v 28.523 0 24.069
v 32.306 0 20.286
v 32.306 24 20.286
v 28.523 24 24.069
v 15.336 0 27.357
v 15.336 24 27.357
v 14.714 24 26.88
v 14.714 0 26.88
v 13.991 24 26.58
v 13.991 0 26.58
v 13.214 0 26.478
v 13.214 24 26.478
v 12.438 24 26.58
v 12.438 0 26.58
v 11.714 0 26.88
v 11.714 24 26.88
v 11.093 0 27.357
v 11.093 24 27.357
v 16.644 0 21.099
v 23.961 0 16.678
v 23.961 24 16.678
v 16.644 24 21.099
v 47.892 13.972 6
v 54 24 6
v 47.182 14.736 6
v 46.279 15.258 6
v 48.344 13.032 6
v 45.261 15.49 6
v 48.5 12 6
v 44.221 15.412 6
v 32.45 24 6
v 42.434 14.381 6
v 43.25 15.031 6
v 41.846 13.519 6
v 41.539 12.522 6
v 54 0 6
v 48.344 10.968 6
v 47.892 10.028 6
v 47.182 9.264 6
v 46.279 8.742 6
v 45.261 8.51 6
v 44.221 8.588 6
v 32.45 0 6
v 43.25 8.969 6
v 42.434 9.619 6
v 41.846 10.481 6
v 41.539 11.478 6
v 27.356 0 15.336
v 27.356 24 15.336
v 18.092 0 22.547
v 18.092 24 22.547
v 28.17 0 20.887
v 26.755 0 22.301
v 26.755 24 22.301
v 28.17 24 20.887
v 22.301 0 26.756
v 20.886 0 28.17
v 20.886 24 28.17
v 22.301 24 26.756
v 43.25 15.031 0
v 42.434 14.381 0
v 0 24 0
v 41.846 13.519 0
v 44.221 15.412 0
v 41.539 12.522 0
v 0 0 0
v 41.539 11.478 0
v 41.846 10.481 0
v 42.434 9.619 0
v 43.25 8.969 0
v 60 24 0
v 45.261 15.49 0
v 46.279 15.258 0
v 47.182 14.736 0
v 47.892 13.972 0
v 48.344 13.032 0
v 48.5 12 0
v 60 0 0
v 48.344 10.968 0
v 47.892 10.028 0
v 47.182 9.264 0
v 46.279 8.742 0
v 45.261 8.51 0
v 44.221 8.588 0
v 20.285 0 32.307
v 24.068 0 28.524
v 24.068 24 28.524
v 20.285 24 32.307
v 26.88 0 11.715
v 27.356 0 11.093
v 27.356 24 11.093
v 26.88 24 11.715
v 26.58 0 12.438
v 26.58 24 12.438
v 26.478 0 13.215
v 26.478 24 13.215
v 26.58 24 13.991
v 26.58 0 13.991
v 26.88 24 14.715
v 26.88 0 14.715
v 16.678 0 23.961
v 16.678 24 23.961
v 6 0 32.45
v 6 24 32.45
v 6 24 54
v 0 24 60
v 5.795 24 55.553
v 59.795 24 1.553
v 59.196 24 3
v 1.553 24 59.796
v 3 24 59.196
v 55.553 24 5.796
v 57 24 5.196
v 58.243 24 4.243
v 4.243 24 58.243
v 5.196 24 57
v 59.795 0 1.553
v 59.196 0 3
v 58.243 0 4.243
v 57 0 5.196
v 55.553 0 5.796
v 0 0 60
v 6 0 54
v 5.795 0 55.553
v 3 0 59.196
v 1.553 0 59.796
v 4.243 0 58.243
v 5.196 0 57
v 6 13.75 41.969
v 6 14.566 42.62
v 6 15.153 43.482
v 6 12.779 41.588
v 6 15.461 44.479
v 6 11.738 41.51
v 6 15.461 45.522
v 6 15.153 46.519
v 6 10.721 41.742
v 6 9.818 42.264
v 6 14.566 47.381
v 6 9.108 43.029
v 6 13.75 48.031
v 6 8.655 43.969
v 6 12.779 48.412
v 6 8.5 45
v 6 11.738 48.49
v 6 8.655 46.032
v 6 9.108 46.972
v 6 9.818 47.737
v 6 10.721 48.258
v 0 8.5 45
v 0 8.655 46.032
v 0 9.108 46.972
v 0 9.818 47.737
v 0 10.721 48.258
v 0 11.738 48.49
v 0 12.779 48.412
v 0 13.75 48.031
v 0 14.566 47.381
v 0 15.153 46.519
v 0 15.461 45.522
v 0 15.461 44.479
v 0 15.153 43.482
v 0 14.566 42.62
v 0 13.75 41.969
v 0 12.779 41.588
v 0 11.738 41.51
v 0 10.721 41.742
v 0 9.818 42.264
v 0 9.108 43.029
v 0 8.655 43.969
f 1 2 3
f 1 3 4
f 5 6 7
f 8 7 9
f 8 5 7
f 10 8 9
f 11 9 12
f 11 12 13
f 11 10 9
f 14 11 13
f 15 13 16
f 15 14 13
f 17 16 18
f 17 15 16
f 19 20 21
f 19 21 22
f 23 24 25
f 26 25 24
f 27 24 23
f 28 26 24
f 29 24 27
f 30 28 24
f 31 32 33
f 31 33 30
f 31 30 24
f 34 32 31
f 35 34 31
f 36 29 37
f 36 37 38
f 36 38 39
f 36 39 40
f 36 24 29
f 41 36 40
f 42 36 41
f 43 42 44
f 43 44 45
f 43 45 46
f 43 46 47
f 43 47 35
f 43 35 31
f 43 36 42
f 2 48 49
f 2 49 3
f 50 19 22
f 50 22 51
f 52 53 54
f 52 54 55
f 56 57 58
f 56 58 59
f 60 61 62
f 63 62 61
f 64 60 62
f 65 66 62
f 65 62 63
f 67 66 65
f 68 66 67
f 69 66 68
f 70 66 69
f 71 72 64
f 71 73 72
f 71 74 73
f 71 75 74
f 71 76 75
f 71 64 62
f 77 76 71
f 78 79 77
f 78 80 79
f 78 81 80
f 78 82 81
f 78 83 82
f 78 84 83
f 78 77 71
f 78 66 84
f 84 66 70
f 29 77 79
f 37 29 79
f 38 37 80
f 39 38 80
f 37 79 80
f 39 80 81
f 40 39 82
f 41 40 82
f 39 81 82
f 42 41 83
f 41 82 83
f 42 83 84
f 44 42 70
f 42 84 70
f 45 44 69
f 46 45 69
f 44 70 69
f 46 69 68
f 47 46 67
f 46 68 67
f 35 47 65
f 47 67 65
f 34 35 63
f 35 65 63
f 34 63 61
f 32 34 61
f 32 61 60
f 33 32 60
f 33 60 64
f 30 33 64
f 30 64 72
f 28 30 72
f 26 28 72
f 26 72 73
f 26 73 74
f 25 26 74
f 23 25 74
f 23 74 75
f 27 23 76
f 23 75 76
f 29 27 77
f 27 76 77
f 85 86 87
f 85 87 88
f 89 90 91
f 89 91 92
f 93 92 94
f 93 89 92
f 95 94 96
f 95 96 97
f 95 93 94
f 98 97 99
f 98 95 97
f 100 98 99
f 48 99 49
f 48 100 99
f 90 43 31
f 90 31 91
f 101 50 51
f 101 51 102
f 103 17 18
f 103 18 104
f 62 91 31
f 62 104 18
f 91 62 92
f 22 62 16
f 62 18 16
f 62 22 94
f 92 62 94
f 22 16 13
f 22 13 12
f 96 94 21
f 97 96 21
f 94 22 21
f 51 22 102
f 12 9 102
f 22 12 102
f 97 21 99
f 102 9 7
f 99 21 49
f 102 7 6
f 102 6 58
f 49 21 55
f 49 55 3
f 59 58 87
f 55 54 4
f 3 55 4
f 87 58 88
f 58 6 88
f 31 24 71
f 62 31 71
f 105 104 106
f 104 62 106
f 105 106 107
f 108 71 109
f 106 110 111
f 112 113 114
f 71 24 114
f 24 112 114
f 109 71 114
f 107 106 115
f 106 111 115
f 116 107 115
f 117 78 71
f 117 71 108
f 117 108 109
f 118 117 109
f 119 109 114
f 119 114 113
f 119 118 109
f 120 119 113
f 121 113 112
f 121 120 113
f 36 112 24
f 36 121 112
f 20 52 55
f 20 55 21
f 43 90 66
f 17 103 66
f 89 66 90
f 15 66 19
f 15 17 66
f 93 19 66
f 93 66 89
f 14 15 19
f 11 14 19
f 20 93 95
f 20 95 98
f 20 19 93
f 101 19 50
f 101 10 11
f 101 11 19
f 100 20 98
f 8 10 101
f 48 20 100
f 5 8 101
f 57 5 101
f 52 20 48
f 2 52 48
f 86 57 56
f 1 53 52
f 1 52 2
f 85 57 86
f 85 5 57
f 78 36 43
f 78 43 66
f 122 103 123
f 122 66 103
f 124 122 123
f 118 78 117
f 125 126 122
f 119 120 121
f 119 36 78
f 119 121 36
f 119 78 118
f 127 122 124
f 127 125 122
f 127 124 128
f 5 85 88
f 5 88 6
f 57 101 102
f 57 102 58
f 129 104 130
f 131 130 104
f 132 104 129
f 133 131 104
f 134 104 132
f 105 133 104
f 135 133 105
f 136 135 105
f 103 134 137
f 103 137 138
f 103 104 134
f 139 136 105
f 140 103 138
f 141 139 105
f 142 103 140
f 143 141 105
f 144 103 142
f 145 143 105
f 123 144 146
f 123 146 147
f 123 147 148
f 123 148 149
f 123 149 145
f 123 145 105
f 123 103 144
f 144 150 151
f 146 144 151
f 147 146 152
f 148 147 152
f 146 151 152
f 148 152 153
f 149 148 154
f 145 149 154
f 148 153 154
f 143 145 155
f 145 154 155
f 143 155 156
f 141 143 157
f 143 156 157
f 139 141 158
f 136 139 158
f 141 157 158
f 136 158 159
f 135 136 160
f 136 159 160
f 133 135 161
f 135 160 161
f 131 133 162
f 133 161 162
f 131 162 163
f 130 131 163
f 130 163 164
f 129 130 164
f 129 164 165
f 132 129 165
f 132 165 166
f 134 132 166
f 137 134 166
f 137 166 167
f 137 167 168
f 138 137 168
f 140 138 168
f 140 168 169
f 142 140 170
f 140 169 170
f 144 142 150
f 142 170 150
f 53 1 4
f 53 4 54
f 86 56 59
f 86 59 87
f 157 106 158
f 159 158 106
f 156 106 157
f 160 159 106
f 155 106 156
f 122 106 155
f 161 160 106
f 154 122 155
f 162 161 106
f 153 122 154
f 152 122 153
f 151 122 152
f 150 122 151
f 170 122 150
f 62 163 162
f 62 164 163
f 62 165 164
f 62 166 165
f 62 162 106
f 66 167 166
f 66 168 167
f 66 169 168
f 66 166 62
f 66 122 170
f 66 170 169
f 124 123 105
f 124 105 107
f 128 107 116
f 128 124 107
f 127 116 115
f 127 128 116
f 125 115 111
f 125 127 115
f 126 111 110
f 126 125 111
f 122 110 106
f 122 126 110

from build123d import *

# Parameters (mm, degrees)
F1_DEPTH = 24
F2_R     = 3.5
F3_DEPTH = 6
F4_R     = 3.5
F5_DEPTH = 6


# Not quite as in the source:
# - ends of sketch curves that miss each other by under 0.0002 mm in the source are joined


with BuildPart() as f1:
    # F0 (on Front) → F1 (new body)
    with BuildSketch(Plane.XZ):
        with BuildLine():
            Line((5.999886, 45.000227), (-0.000114, 45.000227))
            Line((-0.000114, 45.000227), (-0.000114, 0.000227))
            Line((-0.000114, 0.000227), (44.999886, 0.000227))
            Line((44.999886, 0.000227), (44.999886, 6.000227))
            Line((44.999886, 6.000227), (32.449634, 6.000227))
            Line((32.449634, 6.000227), (27.356487, 11.093373))
            ThreePointArc((27.356487, 11.093373), (26.477808, 13.214693), (27.3564876564, 15.3360133436))
            Line((27.3564876564, 15.3360133436), (32.306235, 20.285761))
            Line((32.306235, 20.285761), (28.523214, 24.068783))
            Line((28.523214, 24.068783), (26.755447, 22.301016))
            Line((26.755447, 22.301016), (28.16966, 20.886802))
            Line((28.16966, 20.886802), (23.960753, 16.677895))
            Line((23.960753, 16.677895), (16.64382, 21.098934))
            Line((16.64382, 21.098934), (18.091767, 22.546881))
            Line((18.091767, 22.546881), (16.677553, 23.961095))
            Line((16.677553, 23.961095), (20.88646, 28.170002))
            Line((20.88646, 28.170002), (22.300674, 26.755788))
            Line((22.300674, 26.755788), (24.068441, 28.523555))
            Line((24.068441, 28.523555), (20.28542, 32.306577))
            Line((20.28542, 32.306577), (15.335672, 27.356829))
            ThreePointArc((15.335672, 27.356829), (13.2143523536, 26.47815), (11.0930316564, 27.3568296564))
            Line((11.0930316564, 27.3568296564), (5.999886, 32.449975))
            Line((5.999886, 32.449975), (5.999886, 45.000227))
        make_face()
        with BuildLine():
            ThreePointArc((4.499886, 4.000227), (4.1463326094, 4.1466736094), (3.999886, 4.500227))
            Line((3.999886, 4.500227), (3.999886, 29.000227))
            ThreePointArc((3.999886, 29.000227), (4.3085446105, 29.4621669016), (4.8534398906, 29.3537798906))
            Line((4.8534398906, 29.3537798906), (13.567905, 20.639315))
            Line((13.567905, 20.639315), (11.243789, 18.315199))
            ThreePointArc((11.243789, 18.315199), (10.3880809238, 17.170688427), (9.8910739732, 15.8308650058))
            Line((9.8910739732, 15.8308650058), (11.753138, 13.968801))
            Line((11.753138, 13.968801), (12.364509, 14.132617))
            ThreePointArc((12.364509, 14.132617), (16.54708952, 16.547432386), (14.1322760675, 12.364850252))
            Line((14.1322760675, 12.364850252), (13.968459, 11.75348))
            Line((13.968459, 11.75348), (15.830523, 9.891416))
            ThreePointArc((15.830523, 9.891416), (17.1703461165, 10.3884227548), (18.3148569059, 11.2441310941))
            Line((18.3148569059, 11.2441310941), (20.638973, 13.568247))
            Line((20.638973, 13.568247), (29.353439, 4.853781))
            ThreePointArc((29.353439, 4.853781), (29.461825631, 4.3088849572), (28.999886, 4.000227))
            Line((28.999886, 4.000227), (4.499886, 4.000227))
        make_face(mode=Mode.SUBTRACT)
        with BuildLine():
            Line((3.999886, 29.000227), (3.999886, 4.500227))
            ThreePointArc((3.999886, 4.500227), (4.1463326094, 4.1466736094), (4.499886, 4.000227))
            Line((4.499886, 4.000227), (28.999886, 4.000227))
            ThreePointArc((28.999886, 4.000227), (29.461825631, 4.3088849572), (29.3534398906, 4.8537798906))
            Line((29.3534398906, 4.8537798906), (20.638973, 13.568247))
            Line((20.638973, 13.568247), (18.314857, 11.244131))
            ThreePointArc((18.314857, 11.244131), (17.1703461165, 10.3884227548), (15.8305230058, 9.8914159732))
            Line((15.8305230058, 9.8914159732), (13.968459, 11.75348))
            Line((13.968459, 11.75348), (14.132276, 12.36485))
            ThreePointArc((14.132276, 12.36485), (16.54708952, 16.547432386), (12.364508569, 14.1326168845))
            Line((12.364508569, 14.1326168845), (11.753138, 13.968801))
            Line((11.753138, 13.968801), (9.891074, 15.830865))
            ThreePointArc((9.891074, 15.830865), (10.3880809238, 17.170688427), (11.2437895941, 18.3151994059))
            Line((11.2437895941, 18.3151994059), (13.567905, 20.639315))
            Line((13.567905, 20.639315), (4.853439, 29.353781))
            ThreePointArc((4.853439, 29.353781), (4.3085446105, 29.4621669016), (3.999886, 29.000227))
        make_face()
        with BuildLine():
            ThreePointArc((5.999886, 54.000227), (4.2425266871, 58.2428676871), (-0.000114, 60.000227))
            Line((-0.000114, 60.000227), (-0.000114, 45.000227))
            Line((-0.000114, 45.000227), (5.999886, 45.000227))
            Line((5.999886, 45.000227), (5.999886, 54.000227))
        make_face()
        with BuildLine():
            Line((44.999886, 6.000227), (44.999886, 0.000227))
            Line((44.999886, 0.000227), (59.999886, 0.000227))
            ThreePointArc((59.999886, 0.000227), (58.2425266871, 4.2428676871), (53.999886, 6.000227))
            Line((53.999886, 6.000227), (44.999886, 6.000227))
        make_face()
    extrude(amount=-F1_DEPTH)

    # F2 (on face) → F3 (cut)
    with BuildSketch(Plane(origin=(-0.000114, 0, 0), x_dir=(0, -1, 0), z_dir=(-1, 0, 0))):
        with Locations((-12, 45.000227)):
            Circle(F2_R)
    extrude(amount=-F3_DEPTH, mode=Mode.SUBTRACT)

    # F4 (on face) → F5 (cut)
    with BuildSketch(Plane(origin=(0, 0, 0.000227), x_dir=(1, 0, 0), z_dir=(0, 0, -1))):
        with Locations((44.999886, -12)):
            Circle(F4_R)
    extrude(amount=-F5_DEPTH, mode=Mode.SUBTRACT)


solid = f1.part
